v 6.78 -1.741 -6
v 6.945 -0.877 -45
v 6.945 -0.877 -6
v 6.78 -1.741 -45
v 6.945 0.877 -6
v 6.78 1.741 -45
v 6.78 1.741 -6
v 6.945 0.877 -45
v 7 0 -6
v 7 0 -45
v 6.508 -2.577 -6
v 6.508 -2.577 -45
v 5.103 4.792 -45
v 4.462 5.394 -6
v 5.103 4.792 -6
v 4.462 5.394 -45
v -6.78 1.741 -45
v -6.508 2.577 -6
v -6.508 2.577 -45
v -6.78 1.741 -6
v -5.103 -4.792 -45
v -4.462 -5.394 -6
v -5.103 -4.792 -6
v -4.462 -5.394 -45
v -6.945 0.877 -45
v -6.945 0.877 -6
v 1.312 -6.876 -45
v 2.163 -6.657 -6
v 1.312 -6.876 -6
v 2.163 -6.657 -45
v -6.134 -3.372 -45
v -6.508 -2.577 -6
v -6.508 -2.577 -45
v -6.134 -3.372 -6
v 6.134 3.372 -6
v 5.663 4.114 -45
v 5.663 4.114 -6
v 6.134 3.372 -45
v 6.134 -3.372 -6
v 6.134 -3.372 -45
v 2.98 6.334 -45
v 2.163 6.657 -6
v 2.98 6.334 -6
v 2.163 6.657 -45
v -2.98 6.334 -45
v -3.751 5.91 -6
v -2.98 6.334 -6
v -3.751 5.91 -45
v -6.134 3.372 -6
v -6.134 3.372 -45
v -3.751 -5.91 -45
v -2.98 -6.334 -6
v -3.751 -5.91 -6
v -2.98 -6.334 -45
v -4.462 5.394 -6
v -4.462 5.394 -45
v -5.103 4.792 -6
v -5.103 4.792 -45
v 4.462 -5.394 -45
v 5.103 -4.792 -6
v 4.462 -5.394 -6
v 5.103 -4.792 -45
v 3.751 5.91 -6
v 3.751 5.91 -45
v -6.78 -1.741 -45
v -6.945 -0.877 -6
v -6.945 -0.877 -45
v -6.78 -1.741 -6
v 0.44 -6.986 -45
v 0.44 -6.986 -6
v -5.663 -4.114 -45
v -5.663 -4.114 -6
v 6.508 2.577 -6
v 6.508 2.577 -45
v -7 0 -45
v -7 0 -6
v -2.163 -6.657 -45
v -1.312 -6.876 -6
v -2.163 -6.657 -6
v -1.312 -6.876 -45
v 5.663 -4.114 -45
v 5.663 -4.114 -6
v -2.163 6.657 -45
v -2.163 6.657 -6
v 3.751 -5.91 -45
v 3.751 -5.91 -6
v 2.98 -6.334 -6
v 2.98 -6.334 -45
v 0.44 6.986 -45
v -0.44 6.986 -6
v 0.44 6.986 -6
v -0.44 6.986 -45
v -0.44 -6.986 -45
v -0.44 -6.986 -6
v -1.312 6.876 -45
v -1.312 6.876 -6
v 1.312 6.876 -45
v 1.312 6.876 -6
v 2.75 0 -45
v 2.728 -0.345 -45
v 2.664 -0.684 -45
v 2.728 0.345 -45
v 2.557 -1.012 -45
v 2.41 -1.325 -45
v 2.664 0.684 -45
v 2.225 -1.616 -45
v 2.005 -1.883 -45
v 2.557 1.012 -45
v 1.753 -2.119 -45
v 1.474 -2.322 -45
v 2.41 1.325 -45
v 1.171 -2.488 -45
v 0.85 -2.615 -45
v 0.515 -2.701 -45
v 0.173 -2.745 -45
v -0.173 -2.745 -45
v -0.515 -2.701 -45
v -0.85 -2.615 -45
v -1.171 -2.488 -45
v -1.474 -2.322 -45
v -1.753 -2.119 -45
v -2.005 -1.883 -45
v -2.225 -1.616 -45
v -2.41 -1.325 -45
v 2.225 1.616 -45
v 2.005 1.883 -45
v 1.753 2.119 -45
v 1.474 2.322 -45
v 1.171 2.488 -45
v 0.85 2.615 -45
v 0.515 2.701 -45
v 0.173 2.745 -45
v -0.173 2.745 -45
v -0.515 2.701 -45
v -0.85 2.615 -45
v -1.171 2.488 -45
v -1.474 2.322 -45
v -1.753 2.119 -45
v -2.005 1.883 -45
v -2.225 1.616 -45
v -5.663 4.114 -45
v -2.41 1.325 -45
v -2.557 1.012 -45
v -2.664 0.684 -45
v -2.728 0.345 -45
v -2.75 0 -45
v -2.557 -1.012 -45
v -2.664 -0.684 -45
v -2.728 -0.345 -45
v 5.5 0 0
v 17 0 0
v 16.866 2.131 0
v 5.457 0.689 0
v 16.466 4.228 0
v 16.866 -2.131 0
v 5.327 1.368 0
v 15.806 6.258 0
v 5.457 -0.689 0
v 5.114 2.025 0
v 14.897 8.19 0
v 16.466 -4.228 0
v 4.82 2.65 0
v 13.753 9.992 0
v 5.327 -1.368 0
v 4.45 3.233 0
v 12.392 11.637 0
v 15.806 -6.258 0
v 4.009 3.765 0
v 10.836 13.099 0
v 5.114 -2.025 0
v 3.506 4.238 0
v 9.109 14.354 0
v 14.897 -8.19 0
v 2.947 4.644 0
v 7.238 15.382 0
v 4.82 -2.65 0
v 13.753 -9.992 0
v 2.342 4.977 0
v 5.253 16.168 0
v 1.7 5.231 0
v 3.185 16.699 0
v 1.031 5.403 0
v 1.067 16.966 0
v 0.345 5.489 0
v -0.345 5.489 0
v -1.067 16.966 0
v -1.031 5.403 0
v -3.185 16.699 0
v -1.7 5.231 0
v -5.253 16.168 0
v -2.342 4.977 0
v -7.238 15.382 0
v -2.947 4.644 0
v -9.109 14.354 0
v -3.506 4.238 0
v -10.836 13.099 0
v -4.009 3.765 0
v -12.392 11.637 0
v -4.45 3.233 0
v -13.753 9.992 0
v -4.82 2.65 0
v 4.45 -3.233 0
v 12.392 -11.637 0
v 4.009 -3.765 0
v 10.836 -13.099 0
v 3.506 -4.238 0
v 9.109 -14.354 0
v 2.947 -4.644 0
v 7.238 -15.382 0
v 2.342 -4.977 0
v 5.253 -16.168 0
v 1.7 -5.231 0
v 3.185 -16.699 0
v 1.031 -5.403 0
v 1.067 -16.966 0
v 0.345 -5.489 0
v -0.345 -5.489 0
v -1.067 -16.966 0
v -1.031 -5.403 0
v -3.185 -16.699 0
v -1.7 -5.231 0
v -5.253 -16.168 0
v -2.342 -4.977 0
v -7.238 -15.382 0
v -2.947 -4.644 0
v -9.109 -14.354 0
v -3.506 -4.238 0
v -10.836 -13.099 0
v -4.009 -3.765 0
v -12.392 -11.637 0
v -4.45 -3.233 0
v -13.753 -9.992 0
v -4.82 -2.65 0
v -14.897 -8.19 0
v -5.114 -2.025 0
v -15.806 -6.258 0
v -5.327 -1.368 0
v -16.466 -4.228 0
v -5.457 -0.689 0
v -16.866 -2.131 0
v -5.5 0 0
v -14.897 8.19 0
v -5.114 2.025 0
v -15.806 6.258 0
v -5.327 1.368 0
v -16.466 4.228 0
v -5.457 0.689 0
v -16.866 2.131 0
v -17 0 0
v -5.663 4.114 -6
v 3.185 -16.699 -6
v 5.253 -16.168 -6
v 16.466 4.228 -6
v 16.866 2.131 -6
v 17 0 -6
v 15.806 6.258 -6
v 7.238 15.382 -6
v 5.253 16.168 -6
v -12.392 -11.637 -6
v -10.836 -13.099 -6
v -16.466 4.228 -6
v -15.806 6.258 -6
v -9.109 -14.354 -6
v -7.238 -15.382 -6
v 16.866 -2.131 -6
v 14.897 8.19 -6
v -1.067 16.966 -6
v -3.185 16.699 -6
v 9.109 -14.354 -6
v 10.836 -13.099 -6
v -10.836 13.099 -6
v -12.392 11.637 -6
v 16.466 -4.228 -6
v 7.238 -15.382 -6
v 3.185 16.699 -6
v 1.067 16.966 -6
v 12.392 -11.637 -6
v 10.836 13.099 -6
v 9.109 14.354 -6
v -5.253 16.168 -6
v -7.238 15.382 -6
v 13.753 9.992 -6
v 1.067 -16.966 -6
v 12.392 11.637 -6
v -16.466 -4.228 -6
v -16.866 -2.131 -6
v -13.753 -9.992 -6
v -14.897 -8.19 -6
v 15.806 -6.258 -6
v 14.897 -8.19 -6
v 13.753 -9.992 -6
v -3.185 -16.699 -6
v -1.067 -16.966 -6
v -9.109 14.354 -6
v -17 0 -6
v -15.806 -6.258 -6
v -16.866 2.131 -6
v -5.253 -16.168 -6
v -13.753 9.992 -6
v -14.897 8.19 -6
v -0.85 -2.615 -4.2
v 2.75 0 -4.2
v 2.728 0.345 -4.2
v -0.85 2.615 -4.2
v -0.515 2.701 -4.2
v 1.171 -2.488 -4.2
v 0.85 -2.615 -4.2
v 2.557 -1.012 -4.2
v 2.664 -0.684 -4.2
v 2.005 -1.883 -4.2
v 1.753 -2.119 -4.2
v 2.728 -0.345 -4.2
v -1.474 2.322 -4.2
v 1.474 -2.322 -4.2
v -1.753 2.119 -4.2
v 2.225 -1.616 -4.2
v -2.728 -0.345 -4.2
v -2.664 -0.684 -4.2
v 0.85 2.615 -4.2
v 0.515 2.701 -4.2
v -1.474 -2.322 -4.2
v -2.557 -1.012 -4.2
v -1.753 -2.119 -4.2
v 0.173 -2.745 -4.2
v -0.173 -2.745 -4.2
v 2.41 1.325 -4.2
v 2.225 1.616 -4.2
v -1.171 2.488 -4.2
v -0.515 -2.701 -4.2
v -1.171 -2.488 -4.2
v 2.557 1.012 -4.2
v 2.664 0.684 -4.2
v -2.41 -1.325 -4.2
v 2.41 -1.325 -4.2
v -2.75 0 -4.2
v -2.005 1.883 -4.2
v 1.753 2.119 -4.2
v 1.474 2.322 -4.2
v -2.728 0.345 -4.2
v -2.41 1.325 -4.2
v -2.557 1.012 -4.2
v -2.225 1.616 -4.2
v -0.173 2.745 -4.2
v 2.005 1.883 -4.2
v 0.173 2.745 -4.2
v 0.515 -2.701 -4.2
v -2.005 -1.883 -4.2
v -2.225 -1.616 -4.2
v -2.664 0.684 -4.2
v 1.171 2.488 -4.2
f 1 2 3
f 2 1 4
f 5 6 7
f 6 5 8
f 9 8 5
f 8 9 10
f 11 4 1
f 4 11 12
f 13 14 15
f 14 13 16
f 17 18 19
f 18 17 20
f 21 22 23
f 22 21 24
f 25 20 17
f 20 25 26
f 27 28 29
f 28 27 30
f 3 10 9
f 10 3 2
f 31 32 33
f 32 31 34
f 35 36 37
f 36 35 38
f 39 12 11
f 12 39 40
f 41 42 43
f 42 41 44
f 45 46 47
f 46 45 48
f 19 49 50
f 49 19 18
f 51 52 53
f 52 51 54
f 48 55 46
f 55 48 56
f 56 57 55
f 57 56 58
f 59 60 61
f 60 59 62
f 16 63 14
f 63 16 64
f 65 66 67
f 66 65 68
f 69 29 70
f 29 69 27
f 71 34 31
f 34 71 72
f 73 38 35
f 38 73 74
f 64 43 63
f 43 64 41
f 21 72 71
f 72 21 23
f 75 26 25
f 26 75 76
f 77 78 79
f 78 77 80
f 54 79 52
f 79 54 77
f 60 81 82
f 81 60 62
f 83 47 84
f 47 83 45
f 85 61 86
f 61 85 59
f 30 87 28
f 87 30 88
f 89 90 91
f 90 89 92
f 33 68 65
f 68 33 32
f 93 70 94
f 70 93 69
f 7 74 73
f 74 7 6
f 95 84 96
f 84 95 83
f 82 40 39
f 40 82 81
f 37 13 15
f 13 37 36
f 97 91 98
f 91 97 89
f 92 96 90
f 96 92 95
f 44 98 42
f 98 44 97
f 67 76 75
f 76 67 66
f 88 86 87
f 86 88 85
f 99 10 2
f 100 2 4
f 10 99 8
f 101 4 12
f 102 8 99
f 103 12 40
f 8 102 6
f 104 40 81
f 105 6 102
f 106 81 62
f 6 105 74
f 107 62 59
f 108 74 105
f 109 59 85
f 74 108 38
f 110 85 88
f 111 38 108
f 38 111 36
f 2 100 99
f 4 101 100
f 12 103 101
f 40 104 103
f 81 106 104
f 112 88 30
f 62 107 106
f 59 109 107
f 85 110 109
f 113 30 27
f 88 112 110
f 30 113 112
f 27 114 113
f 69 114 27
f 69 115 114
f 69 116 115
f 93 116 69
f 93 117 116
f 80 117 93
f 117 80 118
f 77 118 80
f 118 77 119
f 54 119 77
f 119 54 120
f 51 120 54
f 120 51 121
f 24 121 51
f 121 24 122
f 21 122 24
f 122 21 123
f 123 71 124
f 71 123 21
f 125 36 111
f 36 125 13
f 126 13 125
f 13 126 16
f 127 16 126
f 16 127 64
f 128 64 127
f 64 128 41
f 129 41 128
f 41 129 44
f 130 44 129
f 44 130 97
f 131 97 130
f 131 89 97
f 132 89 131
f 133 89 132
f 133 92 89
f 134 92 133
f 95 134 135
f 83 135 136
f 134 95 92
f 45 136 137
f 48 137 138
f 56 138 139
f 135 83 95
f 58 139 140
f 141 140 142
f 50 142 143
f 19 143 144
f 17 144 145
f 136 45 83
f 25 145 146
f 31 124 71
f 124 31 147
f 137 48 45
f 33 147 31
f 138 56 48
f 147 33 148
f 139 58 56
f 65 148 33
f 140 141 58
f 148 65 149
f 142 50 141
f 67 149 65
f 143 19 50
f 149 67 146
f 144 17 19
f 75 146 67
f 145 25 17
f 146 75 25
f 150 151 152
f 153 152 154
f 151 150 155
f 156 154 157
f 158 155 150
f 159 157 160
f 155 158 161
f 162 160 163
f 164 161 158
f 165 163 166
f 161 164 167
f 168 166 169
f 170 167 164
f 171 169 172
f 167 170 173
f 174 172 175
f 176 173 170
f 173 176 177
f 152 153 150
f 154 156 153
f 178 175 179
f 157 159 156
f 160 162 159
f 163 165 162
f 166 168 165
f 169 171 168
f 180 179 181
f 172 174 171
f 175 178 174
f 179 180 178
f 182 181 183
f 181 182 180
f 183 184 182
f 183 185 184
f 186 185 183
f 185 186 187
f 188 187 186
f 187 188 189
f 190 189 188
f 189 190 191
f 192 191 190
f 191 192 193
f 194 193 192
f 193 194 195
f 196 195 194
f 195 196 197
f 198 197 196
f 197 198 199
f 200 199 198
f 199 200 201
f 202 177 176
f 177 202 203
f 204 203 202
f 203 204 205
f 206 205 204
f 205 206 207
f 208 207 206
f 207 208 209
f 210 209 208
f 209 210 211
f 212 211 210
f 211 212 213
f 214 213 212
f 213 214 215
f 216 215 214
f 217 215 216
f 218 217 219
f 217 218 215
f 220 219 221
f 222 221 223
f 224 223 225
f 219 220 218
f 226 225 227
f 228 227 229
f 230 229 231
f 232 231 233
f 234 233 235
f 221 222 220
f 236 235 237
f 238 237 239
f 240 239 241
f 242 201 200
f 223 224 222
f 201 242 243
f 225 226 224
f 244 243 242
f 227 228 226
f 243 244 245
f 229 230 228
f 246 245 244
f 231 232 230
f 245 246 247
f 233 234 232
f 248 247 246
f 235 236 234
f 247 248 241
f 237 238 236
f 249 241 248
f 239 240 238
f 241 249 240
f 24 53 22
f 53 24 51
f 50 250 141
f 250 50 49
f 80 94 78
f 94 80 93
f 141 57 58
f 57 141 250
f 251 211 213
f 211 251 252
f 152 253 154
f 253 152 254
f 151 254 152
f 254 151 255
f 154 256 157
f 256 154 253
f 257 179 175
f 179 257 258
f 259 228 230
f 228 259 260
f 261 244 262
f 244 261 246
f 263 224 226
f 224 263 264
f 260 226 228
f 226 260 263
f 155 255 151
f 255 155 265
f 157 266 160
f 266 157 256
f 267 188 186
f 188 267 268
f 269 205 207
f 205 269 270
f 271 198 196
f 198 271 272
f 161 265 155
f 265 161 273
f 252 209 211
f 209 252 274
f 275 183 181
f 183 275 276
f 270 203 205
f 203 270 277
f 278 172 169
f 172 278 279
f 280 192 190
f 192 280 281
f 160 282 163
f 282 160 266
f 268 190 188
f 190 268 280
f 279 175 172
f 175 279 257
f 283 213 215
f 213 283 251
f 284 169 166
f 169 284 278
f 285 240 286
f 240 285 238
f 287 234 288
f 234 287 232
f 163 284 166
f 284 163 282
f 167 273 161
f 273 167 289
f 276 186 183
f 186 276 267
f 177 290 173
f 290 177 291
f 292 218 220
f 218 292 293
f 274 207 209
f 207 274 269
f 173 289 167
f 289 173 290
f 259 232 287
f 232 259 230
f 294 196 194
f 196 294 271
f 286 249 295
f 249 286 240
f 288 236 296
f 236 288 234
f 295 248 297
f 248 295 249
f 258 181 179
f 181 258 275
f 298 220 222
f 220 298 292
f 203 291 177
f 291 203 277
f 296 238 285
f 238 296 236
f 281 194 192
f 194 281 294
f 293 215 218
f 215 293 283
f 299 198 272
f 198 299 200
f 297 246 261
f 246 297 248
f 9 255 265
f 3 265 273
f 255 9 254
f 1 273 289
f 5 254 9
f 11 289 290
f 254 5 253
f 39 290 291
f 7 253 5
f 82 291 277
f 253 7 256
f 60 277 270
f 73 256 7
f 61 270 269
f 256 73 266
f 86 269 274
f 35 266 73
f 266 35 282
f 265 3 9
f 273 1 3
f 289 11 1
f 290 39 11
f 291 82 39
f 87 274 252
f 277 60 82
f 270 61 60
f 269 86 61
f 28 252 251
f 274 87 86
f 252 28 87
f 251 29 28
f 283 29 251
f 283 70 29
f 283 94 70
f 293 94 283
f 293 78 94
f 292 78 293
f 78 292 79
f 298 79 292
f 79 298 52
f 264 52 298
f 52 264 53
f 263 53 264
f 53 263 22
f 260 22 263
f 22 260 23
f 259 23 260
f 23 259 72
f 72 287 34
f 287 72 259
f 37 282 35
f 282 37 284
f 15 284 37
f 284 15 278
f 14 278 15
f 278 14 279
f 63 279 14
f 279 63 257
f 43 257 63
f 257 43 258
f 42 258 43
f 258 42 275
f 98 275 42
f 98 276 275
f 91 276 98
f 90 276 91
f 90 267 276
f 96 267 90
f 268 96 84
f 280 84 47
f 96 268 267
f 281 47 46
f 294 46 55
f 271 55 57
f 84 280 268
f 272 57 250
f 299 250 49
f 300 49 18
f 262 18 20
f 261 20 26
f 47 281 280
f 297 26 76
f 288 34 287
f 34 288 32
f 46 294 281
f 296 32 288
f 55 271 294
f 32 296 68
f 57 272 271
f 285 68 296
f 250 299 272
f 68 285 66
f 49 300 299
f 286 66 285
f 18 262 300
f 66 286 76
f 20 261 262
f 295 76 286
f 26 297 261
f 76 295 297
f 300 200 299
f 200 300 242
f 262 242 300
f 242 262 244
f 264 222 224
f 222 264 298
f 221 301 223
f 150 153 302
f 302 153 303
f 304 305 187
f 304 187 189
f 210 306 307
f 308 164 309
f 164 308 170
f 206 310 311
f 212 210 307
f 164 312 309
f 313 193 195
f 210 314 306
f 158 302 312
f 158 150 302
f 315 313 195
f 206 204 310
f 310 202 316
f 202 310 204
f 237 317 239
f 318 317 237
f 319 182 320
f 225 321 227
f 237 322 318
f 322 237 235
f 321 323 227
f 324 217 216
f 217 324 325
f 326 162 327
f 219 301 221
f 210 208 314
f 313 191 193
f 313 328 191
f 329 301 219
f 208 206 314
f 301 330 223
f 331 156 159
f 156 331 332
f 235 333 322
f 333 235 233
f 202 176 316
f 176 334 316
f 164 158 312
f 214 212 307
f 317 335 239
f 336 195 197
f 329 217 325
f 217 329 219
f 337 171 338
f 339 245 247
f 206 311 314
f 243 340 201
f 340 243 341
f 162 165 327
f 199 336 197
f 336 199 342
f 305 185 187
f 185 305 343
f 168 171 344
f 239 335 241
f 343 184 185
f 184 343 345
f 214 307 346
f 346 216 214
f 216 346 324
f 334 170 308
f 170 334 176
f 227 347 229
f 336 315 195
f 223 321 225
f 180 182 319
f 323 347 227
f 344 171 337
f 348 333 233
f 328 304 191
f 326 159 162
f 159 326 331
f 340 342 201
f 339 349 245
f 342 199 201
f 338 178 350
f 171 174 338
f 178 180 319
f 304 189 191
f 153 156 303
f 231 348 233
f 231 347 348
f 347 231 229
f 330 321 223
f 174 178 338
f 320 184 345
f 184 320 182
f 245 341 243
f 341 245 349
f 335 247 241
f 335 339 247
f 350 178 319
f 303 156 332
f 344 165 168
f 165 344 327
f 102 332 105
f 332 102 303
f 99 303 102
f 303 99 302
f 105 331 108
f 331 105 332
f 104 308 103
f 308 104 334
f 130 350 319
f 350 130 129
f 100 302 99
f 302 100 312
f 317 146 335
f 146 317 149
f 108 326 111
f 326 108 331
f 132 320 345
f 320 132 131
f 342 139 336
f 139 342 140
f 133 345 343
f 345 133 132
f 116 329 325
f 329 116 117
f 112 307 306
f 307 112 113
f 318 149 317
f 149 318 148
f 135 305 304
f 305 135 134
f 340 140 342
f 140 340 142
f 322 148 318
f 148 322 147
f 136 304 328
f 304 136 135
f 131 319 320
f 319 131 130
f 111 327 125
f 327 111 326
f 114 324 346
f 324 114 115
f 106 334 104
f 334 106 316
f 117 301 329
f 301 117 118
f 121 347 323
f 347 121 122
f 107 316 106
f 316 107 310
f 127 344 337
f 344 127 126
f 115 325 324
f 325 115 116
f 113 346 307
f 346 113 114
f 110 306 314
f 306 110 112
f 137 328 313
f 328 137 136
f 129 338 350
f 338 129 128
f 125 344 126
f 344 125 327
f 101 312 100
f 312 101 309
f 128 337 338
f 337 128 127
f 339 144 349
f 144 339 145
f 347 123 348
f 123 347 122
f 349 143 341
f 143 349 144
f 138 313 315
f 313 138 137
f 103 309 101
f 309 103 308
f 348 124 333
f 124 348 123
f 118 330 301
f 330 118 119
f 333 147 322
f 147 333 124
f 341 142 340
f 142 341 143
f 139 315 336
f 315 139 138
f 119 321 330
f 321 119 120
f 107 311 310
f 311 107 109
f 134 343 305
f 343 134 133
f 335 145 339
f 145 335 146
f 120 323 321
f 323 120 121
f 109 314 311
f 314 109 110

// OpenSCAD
$fn = 50;


difference() {
	union() {
		translate(v = [0, 0, -45.0000000000]) {
			cylinder(h = 45, r = 7.0000000000);
		}
		translate(v = [0, 0, -6.0000000000]) {
			cylinder(h = 6, r = 17.0000000000);
		}
	}
	union() {
		translate(v = [0, 0, 0]) {
			rotate(a = [0, 0, 0]) {
				difference() {
					union() {
						#translate(v = [0, 0, -45.0000000000]) {
							cylinder(h = 45, r = 2.2500000000);
						}
						#translate(v = [0, 0, -4.2000000000]) {
							cylinder(h = 4.2000000000, r = 7.0000000000, r1 = 2.7500000000, r2 = 5.5000000000);
						}
						#translate(v = [0, 0, -45.0000000000]) {
							cylinder(h = 45, r = 2.7500000000);
						}
						#translate(v = [0, 0, -45.0000000000]) {
							cylinder(h = 45, r = 2.2500000000);
						}
					}
					union();
				}
			}
		}
	}
}
